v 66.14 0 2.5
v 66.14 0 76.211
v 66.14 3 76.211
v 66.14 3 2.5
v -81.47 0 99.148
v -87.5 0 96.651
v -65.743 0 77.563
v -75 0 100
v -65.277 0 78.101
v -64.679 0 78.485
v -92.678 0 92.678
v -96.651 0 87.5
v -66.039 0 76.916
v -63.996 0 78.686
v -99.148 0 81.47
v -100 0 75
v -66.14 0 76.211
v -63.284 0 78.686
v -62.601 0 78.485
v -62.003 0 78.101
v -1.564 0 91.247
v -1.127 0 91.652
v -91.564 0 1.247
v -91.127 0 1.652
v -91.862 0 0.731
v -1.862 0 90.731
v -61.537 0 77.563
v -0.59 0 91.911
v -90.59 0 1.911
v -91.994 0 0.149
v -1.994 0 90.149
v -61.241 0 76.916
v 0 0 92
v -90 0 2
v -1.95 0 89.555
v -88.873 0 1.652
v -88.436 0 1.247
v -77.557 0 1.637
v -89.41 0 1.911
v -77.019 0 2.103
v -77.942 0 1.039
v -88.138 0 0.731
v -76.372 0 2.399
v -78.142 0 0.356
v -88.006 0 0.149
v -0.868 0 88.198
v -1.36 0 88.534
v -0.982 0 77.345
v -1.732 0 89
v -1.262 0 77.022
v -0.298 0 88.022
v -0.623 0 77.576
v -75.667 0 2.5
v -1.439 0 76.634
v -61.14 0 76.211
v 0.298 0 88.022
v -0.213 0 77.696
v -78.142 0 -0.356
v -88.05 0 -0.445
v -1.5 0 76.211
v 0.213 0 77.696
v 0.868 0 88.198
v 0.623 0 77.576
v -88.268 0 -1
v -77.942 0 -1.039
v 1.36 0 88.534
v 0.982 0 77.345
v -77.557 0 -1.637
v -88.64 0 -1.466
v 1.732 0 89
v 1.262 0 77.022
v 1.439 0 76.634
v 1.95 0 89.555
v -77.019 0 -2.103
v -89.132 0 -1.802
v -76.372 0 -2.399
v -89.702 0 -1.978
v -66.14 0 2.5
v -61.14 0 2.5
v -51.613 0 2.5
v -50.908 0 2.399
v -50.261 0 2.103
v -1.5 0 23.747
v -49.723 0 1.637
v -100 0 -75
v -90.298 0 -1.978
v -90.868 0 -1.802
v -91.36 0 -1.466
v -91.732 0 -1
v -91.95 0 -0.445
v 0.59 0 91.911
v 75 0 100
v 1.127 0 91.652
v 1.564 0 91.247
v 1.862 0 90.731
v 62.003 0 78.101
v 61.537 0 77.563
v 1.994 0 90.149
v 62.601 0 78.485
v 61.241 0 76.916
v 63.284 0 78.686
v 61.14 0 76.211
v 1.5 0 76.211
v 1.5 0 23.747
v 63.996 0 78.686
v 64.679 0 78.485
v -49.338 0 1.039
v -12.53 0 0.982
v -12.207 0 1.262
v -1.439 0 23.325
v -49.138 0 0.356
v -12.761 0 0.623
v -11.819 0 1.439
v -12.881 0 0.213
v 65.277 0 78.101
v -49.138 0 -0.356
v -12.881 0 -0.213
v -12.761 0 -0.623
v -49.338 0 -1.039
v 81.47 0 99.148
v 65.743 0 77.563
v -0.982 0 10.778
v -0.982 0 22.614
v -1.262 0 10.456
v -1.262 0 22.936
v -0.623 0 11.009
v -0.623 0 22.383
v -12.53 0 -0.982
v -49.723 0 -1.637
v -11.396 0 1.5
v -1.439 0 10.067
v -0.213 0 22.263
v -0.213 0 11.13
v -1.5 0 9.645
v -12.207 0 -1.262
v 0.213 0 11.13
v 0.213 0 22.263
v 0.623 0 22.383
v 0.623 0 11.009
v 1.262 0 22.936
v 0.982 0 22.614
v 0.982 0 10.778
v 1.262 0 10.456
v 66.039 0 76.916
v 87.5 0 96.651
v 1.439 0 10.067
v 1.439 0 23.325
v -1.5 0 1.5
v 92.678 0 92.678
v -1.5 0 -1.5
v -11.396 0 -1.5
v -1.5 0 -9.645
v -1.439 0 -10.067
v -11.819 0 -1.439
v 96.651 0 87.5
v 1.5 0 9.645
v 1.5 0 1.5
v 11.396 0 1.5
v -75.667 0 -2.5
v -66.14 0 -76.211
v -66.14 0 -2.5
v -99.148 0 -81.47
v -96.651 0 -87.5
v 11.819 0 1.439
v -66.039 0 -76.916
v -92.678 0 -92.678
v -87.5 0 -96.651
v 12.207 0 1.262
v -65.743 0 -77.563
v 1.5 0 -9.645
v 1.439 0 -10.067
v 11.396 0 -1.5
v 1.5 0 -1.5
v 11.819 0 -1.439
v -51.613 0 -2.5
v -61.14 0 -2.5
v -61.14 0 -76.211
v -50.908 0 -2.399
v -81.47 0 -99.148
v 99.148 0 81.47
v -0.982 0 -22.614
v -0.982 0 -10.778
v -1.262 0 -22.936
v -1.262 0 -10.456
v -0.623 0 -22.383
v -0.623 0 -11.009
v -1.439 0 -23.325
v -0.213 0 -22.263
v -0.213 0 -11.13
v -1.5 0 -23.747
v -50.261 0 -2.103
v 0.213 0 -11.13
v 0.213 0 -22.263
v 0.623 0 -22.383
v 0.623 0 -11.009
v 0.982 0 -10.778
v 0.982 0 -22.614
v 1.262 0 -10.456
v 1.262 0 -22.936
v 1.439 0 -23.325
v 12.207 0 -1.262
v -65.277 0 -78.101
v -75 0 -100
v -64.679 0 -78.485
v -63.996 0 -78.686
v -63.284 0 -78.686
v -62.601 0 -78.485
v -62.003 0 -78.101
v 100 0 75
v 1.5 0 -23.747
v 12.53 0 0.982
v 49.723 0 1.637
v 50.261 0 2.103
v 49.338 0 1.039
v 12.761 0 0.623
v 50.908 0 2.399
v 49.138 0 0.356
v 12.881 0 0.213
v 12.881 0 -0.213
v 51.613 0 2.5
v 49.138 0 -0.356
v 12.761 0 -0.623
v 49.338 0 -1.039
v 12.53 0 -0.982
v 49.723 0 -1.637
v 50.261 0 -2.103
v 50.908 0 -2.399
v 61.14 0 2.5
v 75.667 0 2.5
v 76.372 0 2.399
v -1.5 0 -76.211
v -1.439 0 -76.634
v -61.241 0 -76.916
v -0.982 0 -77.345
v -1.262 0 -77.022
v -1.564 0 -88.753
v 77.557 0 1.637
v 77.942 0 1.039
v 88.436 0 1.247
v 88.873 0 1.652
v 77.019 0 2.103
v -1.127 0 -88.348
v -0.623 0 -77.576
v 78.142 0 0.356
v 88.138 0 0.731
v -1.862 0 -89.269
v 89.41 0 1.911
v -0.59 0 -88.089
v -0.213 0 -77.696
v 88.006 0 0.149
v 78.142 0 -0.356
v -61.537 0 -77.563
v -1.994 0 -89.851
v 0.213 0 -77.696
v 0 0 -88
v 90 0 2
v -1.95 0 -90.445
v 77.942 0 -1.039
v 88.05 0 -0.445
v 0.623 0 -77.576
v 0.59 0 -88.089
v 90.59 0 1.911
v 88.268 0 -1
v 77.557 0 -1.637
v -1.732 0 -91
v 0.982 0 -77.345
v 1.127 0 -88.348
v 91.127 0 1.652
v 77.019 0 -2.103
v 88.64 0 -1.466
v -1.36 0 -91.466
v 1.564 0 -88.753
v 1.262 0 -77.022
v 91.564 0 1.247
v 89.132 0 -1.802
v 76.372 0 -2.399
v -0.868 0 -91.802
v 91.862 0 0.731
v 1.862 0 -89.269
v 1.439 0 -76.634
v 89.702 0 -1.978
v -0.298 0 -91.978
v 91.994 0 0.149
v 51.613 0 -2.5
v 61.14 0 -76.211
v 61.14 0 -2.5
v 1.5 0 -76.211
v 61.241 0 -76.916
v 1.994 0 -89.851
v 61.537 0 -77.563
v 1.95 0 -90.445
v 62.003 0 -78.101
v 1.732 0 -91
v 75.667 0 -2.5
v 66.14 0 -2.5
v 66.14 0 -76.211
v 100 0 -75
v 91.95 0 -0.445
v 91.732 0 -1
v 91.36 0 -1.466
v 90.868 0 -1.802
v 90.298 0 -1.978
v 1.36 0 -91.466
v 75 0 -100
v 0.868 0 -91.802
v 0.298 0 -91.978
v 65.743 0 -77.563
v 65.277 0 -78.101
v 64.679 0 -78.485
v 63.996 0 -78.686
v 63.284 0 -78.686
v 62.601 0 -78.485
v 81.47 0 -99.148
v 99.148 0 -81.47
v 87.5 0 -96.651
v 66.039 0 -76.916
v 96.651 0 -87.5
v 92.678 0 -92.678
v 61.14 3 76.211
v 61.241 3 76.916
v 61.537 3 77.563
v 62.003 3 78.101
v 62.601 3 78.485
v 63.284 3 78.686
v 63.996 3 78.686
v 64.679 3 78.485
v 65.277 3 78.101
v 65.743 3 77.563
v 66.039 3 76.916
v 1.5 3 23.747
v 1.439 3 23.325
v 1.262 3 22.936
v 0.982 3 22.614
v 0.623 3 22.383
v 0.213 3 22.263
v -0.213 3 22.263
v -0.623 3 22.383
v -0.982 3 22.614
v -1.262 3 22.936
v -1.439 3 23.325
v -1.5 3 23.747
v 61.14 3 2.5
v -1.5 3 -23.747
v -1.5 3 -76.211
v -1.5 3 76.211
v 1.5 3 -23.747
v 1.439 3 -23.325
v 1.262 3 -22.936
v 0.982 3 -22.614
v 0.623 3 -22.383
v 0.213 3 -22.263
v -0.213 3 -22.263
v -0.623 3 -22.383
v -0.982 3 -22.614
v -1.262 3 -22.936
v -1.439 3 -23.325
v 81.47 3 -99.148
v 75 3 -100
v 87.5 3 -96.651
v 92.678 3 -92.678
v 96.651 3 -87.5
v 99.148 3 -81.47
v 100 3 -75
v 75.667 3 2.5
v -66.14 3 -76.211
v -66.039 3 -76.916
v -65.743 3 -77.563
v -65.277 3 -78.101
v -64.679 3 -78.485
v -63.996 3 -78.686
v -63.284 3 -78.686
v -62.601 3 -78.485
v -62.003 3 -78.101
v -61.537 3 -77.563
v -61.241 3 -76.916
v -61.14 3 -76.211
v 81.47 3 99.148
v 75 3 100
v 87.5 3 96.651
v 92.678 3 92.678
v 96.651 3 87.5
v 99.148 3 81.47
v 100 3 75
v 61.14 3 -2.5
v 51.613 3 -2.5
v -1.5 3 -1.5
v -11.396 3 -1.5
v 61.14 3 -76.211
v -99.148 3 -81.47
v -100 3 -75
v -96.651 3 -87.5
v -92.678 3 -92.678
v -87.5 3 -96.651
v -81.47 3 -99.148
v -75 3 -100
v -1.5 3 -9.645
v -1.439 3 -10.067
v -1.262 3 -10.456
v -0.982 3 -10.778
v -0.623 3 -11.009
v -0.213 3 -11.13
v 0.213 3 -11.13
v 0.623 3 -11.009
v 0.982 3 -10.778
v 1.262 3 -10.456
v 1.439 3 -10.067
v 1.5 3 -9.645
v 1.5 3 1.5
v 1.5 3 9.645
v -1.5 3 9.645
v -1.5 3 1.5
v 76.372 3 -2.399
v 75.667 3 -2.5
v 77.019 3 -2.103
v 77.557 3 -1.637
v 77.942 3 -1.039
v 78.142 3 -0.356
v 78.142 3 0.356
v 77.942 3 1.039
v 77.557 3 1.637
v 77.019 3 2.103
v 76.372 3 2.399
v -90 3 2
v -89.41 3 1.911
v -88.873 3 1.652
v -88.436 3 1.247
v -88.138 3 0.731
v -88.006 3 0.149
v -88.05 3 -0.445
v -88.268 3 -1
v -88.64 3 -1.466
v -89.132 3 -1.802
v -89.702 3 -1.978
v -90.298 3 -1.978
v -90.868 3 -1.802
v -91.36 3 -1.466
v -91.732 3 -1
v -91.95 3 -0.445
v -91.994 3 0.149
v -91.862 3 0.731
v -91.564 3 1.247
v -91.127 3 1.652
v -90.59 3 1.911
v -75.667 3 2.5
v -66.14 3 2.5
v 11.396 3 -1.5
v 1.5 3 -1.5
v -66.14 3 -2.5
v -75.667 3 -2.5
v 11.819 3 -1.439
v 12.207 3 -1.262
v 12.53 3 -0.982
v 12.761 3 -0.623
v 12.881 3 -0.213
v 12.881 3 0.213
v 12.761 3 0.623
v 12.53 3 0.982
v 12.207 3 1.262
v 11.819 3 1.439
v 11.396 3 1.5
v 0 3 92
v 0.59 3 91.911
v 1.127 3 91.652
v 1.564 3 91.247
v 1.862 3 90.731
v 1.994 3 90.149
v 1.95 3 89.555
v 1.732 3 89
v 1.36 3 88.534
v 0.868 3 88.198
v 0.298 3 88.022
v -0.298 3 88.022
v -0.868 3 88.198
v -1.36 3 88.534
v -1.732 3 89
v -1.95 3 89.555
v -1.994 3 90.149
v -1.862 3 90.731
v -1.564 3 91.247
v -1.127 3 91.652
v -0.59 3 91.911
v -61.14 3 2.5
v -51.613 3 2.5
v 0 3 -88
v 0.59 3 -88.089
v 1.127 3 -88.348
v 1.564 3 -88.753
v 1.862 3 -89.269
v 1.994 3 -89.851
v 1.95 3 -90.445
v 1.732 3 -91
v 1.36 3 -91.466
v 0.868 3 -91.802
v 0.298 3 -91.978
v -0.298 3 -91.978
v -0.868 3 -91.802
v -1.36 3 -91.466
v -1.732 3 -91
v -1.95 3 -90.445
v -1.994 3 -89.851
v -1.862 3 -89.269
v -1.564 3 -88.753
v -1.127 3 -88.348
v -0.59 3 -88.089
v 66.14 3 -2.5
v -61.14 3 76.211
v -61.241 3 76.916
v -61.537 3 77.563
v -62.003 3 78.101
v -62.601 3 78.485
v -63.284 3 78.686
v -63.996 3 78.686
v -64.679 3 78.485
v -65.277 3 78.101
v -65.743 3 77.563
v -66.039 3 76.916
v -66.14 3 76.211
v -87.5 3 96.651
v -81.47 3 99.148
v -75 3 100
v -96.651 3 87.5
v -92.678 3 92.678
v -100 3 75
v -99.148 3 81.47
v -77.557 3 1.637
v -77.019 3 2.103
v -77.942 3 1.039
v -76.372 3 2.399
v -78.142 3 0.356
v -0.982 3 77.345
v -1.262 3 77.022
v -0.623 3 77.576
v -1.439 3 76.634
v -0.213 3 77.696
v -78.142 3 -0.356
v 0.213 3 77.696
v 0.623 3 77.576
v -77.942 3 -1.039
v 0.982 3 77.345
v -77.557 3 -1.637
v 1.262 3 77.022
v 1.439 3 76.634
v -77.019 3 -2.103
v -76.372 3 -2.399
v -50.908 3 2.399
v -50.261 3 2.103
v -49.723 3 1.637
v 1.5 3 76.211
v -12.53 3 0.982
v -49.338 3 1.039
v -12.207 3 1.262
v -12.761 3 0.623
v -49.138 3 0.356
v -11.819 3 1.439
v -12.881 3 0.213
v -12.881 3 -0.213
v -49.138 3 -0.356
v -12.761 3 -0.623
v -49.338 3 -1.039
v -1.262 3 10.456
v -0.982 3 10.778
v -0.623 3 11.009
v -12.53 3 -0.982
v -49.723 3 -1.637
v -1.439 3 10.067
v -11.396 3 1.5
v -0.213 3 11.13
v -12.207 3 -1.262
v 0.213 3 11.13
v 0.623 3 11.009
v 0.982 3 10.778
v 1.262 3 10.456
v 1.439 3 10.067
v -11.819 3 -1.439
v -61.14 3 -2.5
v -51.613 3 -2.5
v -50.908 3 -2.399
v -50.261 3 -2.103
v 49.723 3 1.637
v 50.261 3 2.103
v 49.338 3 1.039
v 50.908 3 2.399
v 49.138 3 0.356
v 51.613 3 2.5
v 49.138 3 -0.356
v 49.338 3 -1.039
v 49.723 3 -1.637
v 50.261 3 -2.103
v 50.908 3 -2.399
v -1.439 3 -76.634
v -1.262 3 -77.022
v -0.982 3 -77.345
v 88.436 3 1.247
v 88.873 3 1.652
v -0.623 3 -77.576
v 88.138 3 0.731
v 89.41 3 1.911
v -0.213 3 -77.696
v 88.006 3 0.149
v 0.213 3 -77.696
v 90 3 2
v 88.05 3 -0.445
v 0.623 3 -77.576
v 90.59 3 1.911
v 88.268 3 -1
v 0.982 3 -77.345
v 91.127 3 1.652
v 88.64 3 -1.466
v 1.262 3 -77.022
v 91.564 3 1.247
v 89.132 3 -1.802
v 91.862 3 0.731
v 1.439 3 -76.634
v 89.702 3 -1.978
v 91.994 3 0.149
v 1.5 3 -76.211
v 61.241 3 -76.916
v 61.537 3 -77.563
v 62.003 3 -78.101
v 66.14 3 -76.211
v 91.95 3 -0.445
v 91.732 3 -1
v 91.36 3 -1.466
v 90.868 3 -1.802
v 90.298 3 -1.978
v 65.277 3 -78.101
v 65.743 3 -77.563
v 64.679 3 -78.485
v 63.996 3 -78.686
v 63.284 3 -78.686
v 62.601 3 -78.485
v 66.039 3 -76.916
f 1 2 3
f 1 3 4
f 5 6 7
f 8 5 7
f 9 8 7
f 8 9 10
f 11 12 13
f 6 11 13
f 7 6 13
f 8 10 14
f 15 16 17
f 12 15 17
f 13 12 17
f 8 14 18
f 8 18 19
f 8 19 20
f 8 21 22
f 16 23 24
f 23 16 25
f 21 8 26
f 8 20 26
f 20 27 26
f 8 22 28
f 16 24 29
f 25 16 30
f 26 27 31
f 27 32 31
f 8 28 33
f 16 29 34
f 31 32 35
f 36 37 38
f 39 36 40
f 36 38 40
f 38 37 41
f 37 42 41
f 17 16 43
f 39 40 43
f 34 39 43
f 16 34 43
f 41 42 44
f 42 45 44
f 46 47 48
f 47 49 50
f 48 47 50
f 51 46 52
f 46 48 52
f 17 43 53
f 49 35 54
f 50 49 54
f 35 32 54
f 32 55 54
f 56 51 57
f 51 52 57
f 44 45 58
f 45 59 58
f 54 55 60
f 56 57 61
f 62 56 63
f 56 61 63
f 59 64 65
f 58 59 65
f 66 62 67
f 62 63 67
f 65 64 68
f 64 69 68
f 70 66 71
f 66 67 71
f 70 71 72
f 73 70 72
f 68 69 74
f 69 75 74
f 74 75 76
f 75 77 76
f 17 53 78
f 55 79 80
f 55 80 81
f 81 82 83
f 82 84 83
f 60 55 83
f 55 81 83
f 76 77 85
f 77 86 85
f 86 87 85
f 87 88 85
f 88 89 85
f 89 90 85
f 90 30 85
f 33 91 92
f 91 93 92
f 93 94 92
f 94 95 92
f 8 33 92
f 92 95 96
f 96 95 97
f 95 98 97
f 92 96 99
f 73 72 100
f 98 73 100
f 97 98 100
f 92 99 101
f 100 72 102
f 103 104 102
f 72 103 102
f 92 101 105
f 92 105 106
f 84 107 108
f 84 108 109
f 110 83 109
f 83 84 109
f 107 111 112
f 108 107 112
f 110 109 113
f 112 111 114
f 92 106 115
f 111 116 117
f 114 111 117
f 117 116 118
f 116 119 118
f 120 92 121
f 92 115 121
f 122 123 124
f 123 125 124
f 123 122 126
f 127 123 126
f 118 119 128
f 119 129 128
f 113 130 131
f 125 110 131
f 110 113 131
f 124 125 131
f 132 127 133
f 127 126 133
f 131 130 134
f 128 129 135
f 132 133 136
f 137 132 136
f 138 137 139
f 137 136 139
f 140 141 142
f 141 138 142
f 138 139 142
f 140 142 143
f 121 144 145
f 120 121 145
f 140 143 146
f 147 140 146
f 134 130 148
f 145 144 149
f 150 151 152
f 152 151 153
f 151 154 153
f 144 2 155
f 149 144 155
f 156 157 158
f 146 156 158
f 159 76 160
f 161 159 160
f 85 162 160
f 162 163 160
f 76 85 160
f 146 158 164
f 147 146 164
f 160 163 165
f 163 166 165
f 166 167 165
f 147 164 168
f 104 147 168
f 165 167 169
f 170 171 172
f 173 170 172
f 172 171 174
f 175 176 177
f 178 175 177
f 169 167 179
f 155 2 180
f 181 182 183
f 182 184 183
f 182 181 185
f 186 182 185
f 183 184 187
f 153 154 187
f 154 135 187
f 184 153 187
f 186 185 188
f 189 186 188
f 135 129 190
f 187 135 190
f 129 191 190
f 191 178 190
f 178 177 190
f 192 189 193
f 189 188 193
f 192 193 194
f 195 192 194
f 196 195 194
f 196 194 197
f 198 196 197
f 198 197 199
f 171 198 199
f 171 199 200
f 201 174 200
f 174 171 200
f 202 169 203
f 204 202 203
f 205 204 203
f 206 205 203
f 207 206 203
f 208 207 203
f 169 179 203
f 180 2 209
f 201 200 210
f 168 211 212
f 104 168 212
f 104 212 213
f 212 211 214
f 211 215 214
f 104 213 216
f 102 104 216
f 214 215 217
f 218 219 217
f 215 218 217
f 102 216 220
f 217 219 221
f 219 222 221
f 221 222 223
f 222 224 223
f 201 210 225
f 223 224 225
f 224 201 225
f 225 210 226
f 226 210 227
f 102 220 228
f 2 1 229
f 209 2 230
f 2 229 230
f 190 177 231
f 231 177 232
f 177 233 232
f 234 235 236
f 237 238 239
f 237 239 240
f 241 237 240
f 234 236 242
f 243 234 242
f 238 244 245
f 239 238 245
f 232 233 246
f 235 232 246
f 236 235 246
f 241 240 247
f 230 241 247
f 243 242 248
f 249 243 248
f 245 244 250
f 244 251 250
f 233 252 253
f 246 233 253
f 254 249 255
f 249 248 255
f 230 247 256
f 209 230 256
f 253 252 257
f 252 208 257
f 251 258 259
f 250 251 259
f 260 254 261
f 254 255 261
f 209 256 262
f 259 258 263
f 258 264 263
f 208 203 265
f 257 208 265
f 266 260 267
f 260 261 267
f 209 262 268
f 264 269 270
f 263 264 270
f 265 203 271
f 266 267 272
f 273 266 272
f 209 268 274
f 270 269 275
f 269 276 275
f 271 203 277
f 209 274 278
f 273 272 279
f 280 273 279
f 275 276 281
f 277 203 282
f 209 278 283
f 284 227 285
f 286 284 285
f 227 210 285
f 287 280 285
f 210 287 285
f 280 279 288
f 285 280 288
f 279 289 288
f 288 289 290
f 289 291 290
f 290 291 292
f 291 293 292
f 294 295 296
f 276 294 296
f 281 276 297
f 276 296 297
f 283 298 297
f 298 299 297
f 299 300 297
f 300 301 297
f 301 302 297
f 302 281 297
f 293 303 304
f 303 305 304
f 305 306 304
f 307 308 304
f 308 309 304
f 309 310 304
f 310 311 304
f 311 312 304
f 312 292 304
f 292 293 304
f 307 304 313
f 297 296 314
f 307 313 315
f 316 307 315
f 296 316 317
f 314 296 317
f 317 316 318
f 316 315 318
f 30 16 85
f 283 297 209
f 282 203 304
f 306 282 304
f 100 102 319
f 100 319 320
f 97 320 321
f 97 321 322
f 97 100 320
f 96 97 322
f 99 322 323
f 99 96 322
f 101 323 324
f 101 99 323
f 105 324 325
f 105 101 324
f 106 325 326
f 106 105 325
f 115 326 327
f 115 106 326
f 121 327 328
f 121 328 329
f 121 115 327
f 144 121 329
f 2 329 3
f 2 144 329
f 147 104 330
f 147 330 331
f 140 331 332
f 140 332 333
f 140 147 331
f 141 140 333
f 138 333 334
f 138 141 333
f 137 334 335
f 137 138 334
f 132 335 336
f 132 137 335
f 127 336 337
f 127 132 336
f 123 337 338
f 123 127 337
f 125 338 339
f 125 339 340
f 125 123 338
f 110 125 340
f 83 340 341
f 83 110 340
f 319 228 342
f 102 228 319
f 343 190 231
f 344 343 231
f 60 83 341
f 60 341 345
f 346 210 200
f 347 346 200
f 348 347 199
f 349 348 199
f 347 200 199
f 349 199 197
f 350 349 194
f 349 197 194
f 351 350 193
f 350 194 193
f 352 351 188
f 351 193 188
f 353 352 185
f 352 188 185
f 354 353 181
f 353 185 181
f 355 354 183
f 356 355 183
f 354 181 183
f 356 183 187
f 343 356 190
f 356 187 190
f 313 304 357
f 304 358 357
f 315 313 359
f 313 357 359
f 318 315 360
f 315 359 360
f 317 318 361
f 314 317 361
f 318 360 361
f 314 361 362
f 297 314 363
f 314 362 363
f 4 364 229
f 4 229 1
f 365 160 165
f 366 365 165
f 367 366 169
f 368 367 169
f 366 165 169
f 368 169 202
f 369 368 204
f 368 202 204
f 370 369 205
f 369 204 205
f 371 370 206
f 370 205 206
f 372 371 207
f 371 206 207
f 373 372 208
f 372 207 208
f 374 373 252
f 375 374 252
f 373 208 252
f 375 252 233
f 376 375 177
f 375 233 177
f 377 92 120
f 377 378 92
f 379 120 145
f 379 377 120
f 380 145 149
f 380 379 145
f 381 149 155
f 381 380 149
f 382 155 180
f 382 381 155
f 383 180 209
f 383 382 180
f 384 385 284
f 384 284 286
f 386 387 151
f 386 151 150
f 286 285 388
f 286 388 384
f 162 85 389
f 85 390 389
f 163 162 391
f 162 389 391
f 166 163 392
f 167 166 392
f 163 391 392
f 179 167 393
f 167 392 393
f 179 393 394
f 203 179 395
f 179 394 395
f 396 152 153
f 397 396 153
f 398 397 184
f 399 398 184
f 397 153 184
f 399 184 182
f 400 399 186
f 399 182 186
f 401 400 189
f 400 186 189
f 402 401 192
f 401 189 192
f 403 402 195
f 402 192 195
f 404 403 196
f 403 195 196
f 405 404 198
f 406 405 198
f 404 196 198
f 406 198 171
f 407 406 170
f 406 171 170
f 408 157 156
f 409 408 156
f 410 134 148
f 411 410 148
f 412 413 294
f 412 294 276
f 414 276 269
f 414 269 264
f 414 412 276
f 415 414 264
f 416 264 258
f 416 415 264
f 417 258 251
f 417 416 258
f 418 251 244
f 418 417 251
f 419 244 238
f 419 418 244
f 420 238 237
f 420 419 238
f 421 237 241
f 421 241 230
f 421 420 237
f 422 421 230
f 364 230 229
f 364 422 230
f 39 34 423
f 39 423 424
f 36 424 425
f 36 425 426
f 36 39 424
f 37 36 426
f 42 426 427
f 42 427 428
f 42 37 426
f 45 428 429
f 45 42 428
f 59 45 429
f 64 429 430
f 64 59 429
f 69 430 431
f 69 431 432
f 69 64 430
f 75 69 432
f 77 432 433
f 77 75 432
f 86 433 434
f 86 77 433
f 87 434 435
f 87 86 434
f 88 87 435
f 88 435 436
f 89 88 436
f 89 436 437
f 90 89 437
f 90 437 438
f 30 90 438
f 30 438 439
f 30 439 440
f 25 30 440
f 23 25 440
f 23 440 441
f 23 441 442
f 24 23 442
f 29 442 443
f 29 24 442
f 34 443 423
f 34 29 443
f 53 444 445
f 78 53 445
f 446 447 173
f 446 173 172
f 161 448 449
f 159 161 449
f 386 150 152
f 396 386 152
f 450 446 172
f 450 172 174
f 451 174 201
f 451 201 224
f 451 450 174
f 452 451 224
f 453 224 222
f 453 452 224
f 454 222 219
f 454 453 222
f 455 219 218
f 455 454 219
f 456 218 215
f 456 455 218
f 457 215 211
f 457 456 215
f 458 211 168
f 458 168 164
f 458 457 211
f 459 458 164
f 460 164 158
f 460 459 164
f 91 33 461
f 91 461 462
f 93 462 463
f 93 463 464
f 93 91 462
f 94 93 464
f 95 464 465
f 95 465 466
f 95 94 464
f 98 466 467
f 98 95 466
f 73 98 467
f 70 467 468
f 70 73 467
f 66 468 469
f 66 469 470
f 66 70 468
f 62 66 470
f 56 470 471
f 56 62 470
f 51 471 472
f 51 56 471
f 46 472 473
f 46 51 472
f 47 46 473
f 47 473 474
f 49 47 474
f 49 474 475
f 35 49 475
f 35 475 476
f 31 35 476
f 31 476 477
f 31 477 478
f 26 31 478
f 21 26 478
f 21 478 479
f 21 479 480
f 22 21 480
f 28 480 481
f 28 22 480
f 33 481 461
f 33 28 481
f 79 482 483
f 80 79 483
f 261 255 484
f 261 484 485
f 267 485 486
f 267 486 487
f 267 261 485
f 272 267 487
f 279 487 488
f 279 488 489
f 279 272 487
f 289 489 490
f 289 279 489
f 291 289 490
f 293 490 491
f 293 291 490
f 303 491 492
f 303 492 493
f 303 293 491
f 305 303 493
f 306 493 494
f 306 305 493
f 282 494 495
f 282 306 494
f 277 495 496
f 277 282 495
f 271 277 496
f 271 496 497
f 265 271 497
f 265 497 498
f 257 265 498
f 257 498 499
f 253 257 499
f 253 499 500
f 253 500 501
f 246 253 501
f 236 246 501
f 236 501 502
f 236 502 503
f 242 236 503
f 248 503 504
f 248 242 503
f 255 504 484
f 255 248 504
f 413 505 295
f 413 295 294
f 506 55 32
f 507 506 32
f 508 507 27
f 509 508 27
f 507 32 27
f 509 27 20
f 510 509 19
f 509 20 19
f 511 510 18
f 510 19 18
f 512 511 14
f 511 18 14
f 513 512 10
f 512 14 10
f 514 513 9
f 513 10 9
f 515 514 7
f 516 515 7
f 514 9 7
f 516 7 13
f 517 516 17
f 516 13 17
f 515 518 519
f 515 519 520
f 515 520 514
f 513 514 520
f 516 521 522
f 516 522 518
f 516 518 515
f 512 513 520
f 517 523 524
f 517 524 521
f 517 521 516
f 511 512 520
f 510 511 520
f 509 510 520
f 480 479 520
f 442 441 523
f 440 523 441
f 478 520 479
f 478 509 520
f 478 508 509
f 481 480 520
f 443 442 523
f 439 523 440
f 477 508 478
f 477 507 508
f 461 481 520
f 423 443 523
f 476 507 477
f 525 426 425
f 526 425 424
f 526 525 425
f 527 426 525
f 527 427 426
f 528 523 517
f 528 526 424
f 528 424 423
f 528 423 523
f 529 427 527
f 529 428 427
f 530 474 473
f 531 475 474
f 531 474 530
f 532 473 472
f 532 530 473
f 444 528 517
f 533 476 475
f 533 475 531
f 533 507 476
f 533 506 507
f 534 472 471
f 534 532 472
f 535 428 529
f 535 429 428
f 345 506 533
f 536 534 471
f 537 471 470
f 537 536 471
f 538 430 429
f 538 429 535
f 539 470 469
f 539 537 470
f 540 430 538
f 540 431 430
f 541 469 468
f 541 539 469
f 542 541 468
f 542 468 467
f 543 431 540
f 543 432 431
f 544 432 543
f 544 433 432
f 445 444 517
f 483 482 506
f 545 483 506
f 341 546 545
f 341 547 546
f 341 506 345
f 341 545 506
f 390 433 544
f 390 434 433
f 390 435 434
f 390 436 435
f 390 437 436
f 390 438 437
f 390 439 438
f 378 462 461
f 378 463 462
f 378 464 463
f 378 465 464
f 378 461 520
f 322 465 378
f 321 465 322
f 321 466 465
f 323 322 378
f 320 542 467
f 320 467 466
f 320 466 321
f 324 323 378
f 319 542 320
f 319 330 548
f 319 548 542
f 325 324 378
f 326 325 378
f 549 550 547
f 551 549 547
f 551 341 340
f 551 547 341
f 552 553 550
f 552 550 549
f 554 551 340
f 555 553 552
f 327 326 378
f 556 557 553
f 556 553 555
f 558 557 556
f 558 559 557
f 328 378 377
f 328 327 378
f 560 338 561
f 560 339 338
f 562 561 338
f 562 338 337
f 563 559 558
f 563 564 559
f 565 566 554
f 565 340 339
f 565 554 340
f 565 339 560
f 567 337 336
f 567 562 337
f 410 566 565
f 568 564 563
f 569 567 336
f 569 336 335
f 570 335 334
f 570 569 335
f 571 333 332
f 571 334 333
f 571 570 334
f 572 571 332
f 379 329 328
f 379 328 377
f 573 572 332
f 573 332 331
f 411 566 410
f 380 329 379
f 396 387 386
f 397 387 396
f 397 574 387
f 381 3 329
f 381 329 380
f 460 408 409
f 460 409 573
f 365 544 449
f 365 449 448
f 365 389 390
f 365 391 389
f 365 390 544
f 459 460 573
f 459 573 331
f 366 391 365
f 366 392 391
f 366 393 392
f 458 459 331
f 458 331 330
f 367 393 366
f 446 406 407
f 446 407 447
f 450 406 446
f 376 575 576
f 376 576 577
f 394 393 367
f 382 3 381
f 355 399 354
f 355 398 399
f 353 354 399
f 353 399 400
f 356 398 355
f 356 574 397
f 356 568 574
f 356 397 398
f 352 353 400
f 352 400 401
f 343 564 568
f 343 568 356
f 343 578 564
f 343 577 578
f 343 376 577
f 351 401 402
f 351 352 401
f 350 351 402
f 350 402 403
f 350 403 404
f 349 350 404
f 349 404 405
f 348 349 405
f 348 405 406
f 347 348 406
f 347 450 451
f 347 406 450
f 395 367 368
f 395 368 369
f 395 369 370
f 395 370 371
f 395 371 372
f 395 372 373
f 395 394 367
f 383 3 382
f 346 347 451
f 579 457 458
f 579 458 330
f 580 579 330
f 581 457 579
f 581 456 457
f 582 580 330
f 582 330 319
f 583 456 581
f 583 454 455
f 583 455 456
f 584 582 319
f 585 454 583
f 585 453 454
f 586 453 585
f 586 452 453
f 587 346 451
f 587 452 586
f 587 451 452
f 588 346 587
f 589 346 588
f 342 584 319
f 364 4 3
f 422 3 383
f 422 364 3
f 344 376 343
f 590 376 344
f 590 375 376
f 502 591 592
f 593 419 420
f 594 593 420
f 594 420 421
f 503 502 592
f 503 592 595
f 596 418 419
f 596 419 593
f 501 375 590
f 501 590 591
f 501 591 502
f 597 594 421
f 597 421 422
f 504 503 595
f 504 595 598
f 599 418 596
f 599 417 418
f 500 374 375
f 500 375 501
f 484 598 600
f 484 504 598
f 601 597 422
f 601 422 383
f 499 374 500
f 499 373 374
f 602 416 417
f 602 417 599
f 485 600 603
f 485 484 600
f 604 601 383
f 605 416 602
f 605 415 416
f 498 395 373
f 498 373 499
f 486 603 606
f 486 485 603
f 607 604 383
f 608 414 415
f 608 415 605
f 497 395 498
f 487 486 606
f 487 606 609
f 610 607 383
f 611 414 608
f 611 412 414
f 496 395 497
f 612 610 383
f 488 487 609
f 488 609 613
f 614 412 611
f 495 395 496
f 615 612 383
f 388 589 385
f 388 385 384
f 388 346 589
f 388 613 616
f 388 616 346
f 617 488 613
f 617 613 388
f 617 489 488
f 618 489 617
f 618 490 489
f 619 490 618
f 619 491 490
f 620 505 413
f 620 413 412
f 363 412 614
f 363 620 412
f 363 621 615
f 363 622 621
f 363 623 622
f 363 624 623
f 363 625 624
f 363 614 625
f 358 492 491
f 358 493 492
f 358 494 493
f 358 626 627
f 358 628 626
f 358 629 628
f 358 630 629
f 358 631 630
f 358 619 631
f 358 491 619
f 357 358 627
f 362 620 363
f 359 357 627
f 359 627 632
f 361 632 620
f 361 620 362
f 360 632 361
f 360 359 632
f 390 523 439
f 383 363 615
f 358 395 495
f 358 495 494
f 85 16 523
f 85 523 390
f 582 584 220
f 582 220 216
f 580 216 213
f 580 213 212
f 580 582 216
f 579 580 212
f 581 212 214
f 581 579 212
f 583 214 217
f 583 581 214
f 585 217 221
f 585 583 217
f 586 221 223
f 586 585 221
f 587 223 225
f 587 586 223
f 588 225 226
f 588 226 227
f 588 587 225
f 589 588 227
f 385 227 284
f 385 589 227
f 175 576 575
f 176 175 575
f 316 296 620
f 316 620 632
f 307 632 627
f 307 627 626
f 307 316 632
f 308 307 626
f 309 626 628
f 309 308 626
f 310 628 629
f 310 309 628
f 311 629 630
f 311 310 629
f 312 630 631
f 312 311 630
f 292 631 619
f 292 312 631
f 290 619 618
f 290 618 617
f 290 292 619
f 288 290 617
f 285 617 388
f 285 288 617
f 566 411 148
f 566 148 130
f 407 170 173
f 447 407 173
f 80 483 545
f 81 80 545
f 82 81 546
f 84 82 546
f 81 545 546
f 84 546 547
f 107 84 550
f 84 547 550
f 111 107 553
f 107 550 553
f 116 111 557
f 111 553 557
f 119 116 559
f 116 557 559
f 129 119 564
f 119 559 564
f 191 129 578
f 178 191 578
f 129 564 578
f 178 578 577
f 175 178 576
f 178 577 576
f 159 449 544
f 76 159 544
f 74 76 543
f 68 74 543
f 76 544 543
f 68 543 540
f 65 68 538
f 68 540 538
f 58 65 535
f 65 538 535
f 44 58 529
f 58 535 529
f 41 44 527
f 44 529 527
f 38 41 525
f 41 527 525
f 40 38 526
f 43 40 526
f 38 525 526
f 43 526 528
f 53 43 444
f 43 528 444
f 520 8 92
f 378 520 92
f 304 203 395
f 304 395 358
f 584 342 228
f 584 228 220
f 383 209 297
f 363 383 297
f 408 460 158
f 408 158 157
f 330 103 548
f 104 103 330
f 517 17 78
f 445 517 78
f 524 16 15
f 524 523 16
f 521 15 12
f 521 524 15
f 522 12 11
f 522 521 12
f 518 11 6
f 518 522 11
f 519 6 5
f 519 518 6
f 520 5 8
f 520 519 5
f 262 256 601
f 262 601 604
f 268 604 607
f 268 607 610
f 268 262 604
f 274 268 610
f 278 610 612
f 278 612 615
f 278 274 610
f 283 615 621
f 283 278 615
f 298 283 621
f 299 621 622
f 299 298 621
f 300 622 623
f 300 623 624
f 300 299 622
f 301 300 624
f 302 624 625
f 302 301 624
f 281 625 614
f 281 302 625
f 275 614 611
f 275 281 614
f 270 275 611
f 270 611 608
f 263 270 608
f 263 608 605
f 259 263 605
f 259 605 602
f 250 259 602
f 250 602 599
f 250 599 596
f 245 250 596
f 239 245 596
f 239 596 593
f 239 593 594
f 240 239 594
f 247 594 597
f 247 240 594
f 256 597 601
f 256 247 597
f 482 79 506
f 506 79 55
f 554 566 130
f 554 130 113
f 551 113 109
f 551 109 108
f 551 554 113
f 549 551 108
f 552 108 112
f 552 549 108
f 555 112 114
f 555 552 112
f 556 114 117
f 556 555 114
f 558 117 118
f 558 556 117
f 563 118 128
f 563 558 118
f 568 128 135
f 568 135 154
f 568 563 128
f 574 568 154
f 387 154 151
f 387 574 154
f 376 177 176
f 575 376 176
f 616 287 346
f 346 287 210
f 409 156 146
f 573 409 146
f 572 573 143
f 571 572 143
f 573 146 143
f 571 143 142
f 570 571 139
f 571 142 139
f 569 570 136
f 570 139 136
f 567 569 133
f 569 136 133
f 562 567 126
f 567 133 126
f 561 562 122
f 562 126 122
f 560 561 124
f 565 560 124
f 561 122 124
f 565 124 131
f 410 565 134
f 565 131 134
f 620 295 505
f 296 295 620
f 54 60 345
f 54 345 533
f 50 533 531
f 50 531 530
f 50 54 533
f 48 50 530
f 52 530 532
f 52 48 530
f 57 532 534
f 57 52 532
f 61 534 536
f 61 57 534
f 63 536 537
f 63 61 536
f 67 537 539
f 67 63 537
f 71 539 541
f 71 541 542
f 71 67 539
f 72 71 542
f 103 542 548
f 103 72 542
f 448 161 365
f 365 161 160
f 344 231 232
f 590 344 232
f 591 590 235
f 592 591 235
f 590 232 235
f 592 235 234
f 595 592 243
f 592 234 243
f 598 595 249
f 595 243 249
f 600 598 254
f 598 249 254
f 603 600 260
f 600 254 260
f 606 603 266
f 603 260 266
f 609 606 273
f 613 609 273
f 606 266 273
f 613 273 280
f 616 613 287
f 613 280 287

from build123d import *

# Parameters (mm, degrees)
SKETCH_1_W          = 200
SKETCH_1_H          = 200
SKETCH_1_R          = 2
EXTRUDE_1_DEPTH     = 3
FILLET_1_R          = 25
CUT_EXTRUDE_1_DEPTH = 3


with BuildPart() as part:
    # Эскиз1 → Бобышка-Вытянуть1 (new body)
    with BuildSketch(Plane(origin=(0, 0, 0), x_dir=(1, 0, 0), z_dir=(0, 1, 0))):
        Rectangle(SKETCH_1_W, SKETCH_1_H)
        with Locations(Location((-90, 0, 0), (0, 0, 270))):
            Circle(SKETCH_1_R, mode=Mode.SUBTRACT)
        with Locations(Location((0, 90, 0), (0, 0, 270))):
            Circle(SKETCH_1_R, mode=Mode.SUBTRACT)
        with Locations(Location((90, 0, 0), (0, 0, 270))):
            Circle(SKETCH_1_R, mode=Mode.SUBTRACT)
        with Locations(Location((0, -90, 0), (0, 0, 270))):
            Circle(SKETCH_1_R, mode=Mode.SUBTRACT)
        with BuildLine():
            Line((-66.14, -76.211231978), (-66.14, 76.211231978))
            ThreePointArc((-66.14, 76.211231978), (-63.64, 78.711231978), (-61.14, 76.211231978))
            Line((-61.14, 76.211231978), (-61.14, -76.211231978))
            ThreePointArc((-61.14, -76.211231978), (-63.64, -78.711231978), (-66.14, -76.211231978))
        make_face(mode=Mode.SUBTRACT)
        with BuildLine():
            Line((66.14, -76.211231978), (66.14, 76.211231978))
            ThreePointArc((66.14, 76.211231978), (63.64, 78.711231978), (61.14, 76.211231978))
            Line((61.14, 76.211231978), (61.14, -76.211231978))
            ThreePointArc((61.14, -76.211231978), (63.64, -78.711231978), (66.14, -76.211231978))
        make_face(mode=Mode.SUBTRACT)
        with BuildLine():
            Line((1.5, 76.211231978), (1.5, 23.747339046))
            ThreePointArc((1.5, 23.747339046), (0, 22.247339046), (-1.5, 23.747339046))
            Line((-1.5, 23.747339046), (-1.5, 76.211231978))
            ThreePointArc((-1.5, 76.211231978), (0, 77.711231978), (1.5, 76.211231978))
        make_face(mode=Mode.SUBTRACT)
        with BuildLine():
            Line((1.5, -76.211231978), (1.5, -23.747339046))
            ThreePointArc((1.5, -23.747339046), (0, -22.247339046), (-1.5, -23.747339046))
            Line((-1.5, -23.747339046), (-1.5, -76.211231978))
            ThreePointArc((-1.5, -76.211231978), (0, -77.711231978), (1.5, -76.211231978))
        make_face(mode=Mode.SUBTRACT)
        with BuildLine():
            Line((-1.5, -9.644775033), (-1.5, 9.644775033))
            ThreePointArc((-1.5, 9.644775033), (0, 11.144775033), (1.5, 9.644775033))
            Line((1.5, 9.644775033), (1.5, -9.644775033))
            ThreePointArc((1.5, -9.644775033), (0, -11.144775033), (-1.5, -9.644775033))
        make_face(mode=Mode.SUBTRACT)
    extrude(amount=EXTRUDE_1_DEPTH)

    # Скругление1
    fillet_1_edges = [part.edges().sort_by_distance(p)[0] for p in [
        (100, 1.5, 100),
        (-100, 1.5, 100),
        (-100, 1.5, -100),
        (100, 1.5, -100),
    ]]
    fillet(fillet_1_edges, radius=FILLET_1_R)

    # Эскиз2 → Вырез-Вытянуть1 (cut)
    with BuildSketch(Plane(origin=(0, 3, 0), x_dir=(1, 0, 0), z_dir=(0, 1, 0))):
        with BuildLine():
            Line((51.61254098, 2.5), (75.66745902, 2.5))
            ThreePointArc((75.66745902, 2.5), (78.16745902, 0), (75.66745902, -2.5))
            Line((75.66745902, -2.5), (51.61254098, -2.5))
            ThreePointArc((51.61254098, -2.5), (49.11254098, 0), (51.61254098, 2.5))
        make_face()
        with BuildLine():
            Line((-51.61254098, 2.5), (-75.66745902, 2.5))
            ThreePointArc((-75.66745902, 2.5), (-78.16745902, 0), (-75.66745902, -2.5))
            Line((-75.66745902, -2.5), (-51.61254098, -2.5))
            ThreePointArc((-51.61254098, -2.5), (-49.11254098, 0), (-51.61254098, 2.5))
        make_face()
        with BuildLine():
            Line((-11.396089986, 1.5), (11.396089986, 1.5))
            ThreePointArc((11.396089986, 1.5), (12.896089986, 0), (11.396089986, -1.5))
            Line((11.396089986, -1.5), (-11.396089986, -1.5))
            ThreePointArc((-11.396089986, -1.5), (-12.896089986, 0), (-11.396089986, 1.5))
        make_face()
    extrude(amount=-CUT_EXTRUDE_1_DEPTH, mode=Mode.SUBTRACT)


solid = part.part
